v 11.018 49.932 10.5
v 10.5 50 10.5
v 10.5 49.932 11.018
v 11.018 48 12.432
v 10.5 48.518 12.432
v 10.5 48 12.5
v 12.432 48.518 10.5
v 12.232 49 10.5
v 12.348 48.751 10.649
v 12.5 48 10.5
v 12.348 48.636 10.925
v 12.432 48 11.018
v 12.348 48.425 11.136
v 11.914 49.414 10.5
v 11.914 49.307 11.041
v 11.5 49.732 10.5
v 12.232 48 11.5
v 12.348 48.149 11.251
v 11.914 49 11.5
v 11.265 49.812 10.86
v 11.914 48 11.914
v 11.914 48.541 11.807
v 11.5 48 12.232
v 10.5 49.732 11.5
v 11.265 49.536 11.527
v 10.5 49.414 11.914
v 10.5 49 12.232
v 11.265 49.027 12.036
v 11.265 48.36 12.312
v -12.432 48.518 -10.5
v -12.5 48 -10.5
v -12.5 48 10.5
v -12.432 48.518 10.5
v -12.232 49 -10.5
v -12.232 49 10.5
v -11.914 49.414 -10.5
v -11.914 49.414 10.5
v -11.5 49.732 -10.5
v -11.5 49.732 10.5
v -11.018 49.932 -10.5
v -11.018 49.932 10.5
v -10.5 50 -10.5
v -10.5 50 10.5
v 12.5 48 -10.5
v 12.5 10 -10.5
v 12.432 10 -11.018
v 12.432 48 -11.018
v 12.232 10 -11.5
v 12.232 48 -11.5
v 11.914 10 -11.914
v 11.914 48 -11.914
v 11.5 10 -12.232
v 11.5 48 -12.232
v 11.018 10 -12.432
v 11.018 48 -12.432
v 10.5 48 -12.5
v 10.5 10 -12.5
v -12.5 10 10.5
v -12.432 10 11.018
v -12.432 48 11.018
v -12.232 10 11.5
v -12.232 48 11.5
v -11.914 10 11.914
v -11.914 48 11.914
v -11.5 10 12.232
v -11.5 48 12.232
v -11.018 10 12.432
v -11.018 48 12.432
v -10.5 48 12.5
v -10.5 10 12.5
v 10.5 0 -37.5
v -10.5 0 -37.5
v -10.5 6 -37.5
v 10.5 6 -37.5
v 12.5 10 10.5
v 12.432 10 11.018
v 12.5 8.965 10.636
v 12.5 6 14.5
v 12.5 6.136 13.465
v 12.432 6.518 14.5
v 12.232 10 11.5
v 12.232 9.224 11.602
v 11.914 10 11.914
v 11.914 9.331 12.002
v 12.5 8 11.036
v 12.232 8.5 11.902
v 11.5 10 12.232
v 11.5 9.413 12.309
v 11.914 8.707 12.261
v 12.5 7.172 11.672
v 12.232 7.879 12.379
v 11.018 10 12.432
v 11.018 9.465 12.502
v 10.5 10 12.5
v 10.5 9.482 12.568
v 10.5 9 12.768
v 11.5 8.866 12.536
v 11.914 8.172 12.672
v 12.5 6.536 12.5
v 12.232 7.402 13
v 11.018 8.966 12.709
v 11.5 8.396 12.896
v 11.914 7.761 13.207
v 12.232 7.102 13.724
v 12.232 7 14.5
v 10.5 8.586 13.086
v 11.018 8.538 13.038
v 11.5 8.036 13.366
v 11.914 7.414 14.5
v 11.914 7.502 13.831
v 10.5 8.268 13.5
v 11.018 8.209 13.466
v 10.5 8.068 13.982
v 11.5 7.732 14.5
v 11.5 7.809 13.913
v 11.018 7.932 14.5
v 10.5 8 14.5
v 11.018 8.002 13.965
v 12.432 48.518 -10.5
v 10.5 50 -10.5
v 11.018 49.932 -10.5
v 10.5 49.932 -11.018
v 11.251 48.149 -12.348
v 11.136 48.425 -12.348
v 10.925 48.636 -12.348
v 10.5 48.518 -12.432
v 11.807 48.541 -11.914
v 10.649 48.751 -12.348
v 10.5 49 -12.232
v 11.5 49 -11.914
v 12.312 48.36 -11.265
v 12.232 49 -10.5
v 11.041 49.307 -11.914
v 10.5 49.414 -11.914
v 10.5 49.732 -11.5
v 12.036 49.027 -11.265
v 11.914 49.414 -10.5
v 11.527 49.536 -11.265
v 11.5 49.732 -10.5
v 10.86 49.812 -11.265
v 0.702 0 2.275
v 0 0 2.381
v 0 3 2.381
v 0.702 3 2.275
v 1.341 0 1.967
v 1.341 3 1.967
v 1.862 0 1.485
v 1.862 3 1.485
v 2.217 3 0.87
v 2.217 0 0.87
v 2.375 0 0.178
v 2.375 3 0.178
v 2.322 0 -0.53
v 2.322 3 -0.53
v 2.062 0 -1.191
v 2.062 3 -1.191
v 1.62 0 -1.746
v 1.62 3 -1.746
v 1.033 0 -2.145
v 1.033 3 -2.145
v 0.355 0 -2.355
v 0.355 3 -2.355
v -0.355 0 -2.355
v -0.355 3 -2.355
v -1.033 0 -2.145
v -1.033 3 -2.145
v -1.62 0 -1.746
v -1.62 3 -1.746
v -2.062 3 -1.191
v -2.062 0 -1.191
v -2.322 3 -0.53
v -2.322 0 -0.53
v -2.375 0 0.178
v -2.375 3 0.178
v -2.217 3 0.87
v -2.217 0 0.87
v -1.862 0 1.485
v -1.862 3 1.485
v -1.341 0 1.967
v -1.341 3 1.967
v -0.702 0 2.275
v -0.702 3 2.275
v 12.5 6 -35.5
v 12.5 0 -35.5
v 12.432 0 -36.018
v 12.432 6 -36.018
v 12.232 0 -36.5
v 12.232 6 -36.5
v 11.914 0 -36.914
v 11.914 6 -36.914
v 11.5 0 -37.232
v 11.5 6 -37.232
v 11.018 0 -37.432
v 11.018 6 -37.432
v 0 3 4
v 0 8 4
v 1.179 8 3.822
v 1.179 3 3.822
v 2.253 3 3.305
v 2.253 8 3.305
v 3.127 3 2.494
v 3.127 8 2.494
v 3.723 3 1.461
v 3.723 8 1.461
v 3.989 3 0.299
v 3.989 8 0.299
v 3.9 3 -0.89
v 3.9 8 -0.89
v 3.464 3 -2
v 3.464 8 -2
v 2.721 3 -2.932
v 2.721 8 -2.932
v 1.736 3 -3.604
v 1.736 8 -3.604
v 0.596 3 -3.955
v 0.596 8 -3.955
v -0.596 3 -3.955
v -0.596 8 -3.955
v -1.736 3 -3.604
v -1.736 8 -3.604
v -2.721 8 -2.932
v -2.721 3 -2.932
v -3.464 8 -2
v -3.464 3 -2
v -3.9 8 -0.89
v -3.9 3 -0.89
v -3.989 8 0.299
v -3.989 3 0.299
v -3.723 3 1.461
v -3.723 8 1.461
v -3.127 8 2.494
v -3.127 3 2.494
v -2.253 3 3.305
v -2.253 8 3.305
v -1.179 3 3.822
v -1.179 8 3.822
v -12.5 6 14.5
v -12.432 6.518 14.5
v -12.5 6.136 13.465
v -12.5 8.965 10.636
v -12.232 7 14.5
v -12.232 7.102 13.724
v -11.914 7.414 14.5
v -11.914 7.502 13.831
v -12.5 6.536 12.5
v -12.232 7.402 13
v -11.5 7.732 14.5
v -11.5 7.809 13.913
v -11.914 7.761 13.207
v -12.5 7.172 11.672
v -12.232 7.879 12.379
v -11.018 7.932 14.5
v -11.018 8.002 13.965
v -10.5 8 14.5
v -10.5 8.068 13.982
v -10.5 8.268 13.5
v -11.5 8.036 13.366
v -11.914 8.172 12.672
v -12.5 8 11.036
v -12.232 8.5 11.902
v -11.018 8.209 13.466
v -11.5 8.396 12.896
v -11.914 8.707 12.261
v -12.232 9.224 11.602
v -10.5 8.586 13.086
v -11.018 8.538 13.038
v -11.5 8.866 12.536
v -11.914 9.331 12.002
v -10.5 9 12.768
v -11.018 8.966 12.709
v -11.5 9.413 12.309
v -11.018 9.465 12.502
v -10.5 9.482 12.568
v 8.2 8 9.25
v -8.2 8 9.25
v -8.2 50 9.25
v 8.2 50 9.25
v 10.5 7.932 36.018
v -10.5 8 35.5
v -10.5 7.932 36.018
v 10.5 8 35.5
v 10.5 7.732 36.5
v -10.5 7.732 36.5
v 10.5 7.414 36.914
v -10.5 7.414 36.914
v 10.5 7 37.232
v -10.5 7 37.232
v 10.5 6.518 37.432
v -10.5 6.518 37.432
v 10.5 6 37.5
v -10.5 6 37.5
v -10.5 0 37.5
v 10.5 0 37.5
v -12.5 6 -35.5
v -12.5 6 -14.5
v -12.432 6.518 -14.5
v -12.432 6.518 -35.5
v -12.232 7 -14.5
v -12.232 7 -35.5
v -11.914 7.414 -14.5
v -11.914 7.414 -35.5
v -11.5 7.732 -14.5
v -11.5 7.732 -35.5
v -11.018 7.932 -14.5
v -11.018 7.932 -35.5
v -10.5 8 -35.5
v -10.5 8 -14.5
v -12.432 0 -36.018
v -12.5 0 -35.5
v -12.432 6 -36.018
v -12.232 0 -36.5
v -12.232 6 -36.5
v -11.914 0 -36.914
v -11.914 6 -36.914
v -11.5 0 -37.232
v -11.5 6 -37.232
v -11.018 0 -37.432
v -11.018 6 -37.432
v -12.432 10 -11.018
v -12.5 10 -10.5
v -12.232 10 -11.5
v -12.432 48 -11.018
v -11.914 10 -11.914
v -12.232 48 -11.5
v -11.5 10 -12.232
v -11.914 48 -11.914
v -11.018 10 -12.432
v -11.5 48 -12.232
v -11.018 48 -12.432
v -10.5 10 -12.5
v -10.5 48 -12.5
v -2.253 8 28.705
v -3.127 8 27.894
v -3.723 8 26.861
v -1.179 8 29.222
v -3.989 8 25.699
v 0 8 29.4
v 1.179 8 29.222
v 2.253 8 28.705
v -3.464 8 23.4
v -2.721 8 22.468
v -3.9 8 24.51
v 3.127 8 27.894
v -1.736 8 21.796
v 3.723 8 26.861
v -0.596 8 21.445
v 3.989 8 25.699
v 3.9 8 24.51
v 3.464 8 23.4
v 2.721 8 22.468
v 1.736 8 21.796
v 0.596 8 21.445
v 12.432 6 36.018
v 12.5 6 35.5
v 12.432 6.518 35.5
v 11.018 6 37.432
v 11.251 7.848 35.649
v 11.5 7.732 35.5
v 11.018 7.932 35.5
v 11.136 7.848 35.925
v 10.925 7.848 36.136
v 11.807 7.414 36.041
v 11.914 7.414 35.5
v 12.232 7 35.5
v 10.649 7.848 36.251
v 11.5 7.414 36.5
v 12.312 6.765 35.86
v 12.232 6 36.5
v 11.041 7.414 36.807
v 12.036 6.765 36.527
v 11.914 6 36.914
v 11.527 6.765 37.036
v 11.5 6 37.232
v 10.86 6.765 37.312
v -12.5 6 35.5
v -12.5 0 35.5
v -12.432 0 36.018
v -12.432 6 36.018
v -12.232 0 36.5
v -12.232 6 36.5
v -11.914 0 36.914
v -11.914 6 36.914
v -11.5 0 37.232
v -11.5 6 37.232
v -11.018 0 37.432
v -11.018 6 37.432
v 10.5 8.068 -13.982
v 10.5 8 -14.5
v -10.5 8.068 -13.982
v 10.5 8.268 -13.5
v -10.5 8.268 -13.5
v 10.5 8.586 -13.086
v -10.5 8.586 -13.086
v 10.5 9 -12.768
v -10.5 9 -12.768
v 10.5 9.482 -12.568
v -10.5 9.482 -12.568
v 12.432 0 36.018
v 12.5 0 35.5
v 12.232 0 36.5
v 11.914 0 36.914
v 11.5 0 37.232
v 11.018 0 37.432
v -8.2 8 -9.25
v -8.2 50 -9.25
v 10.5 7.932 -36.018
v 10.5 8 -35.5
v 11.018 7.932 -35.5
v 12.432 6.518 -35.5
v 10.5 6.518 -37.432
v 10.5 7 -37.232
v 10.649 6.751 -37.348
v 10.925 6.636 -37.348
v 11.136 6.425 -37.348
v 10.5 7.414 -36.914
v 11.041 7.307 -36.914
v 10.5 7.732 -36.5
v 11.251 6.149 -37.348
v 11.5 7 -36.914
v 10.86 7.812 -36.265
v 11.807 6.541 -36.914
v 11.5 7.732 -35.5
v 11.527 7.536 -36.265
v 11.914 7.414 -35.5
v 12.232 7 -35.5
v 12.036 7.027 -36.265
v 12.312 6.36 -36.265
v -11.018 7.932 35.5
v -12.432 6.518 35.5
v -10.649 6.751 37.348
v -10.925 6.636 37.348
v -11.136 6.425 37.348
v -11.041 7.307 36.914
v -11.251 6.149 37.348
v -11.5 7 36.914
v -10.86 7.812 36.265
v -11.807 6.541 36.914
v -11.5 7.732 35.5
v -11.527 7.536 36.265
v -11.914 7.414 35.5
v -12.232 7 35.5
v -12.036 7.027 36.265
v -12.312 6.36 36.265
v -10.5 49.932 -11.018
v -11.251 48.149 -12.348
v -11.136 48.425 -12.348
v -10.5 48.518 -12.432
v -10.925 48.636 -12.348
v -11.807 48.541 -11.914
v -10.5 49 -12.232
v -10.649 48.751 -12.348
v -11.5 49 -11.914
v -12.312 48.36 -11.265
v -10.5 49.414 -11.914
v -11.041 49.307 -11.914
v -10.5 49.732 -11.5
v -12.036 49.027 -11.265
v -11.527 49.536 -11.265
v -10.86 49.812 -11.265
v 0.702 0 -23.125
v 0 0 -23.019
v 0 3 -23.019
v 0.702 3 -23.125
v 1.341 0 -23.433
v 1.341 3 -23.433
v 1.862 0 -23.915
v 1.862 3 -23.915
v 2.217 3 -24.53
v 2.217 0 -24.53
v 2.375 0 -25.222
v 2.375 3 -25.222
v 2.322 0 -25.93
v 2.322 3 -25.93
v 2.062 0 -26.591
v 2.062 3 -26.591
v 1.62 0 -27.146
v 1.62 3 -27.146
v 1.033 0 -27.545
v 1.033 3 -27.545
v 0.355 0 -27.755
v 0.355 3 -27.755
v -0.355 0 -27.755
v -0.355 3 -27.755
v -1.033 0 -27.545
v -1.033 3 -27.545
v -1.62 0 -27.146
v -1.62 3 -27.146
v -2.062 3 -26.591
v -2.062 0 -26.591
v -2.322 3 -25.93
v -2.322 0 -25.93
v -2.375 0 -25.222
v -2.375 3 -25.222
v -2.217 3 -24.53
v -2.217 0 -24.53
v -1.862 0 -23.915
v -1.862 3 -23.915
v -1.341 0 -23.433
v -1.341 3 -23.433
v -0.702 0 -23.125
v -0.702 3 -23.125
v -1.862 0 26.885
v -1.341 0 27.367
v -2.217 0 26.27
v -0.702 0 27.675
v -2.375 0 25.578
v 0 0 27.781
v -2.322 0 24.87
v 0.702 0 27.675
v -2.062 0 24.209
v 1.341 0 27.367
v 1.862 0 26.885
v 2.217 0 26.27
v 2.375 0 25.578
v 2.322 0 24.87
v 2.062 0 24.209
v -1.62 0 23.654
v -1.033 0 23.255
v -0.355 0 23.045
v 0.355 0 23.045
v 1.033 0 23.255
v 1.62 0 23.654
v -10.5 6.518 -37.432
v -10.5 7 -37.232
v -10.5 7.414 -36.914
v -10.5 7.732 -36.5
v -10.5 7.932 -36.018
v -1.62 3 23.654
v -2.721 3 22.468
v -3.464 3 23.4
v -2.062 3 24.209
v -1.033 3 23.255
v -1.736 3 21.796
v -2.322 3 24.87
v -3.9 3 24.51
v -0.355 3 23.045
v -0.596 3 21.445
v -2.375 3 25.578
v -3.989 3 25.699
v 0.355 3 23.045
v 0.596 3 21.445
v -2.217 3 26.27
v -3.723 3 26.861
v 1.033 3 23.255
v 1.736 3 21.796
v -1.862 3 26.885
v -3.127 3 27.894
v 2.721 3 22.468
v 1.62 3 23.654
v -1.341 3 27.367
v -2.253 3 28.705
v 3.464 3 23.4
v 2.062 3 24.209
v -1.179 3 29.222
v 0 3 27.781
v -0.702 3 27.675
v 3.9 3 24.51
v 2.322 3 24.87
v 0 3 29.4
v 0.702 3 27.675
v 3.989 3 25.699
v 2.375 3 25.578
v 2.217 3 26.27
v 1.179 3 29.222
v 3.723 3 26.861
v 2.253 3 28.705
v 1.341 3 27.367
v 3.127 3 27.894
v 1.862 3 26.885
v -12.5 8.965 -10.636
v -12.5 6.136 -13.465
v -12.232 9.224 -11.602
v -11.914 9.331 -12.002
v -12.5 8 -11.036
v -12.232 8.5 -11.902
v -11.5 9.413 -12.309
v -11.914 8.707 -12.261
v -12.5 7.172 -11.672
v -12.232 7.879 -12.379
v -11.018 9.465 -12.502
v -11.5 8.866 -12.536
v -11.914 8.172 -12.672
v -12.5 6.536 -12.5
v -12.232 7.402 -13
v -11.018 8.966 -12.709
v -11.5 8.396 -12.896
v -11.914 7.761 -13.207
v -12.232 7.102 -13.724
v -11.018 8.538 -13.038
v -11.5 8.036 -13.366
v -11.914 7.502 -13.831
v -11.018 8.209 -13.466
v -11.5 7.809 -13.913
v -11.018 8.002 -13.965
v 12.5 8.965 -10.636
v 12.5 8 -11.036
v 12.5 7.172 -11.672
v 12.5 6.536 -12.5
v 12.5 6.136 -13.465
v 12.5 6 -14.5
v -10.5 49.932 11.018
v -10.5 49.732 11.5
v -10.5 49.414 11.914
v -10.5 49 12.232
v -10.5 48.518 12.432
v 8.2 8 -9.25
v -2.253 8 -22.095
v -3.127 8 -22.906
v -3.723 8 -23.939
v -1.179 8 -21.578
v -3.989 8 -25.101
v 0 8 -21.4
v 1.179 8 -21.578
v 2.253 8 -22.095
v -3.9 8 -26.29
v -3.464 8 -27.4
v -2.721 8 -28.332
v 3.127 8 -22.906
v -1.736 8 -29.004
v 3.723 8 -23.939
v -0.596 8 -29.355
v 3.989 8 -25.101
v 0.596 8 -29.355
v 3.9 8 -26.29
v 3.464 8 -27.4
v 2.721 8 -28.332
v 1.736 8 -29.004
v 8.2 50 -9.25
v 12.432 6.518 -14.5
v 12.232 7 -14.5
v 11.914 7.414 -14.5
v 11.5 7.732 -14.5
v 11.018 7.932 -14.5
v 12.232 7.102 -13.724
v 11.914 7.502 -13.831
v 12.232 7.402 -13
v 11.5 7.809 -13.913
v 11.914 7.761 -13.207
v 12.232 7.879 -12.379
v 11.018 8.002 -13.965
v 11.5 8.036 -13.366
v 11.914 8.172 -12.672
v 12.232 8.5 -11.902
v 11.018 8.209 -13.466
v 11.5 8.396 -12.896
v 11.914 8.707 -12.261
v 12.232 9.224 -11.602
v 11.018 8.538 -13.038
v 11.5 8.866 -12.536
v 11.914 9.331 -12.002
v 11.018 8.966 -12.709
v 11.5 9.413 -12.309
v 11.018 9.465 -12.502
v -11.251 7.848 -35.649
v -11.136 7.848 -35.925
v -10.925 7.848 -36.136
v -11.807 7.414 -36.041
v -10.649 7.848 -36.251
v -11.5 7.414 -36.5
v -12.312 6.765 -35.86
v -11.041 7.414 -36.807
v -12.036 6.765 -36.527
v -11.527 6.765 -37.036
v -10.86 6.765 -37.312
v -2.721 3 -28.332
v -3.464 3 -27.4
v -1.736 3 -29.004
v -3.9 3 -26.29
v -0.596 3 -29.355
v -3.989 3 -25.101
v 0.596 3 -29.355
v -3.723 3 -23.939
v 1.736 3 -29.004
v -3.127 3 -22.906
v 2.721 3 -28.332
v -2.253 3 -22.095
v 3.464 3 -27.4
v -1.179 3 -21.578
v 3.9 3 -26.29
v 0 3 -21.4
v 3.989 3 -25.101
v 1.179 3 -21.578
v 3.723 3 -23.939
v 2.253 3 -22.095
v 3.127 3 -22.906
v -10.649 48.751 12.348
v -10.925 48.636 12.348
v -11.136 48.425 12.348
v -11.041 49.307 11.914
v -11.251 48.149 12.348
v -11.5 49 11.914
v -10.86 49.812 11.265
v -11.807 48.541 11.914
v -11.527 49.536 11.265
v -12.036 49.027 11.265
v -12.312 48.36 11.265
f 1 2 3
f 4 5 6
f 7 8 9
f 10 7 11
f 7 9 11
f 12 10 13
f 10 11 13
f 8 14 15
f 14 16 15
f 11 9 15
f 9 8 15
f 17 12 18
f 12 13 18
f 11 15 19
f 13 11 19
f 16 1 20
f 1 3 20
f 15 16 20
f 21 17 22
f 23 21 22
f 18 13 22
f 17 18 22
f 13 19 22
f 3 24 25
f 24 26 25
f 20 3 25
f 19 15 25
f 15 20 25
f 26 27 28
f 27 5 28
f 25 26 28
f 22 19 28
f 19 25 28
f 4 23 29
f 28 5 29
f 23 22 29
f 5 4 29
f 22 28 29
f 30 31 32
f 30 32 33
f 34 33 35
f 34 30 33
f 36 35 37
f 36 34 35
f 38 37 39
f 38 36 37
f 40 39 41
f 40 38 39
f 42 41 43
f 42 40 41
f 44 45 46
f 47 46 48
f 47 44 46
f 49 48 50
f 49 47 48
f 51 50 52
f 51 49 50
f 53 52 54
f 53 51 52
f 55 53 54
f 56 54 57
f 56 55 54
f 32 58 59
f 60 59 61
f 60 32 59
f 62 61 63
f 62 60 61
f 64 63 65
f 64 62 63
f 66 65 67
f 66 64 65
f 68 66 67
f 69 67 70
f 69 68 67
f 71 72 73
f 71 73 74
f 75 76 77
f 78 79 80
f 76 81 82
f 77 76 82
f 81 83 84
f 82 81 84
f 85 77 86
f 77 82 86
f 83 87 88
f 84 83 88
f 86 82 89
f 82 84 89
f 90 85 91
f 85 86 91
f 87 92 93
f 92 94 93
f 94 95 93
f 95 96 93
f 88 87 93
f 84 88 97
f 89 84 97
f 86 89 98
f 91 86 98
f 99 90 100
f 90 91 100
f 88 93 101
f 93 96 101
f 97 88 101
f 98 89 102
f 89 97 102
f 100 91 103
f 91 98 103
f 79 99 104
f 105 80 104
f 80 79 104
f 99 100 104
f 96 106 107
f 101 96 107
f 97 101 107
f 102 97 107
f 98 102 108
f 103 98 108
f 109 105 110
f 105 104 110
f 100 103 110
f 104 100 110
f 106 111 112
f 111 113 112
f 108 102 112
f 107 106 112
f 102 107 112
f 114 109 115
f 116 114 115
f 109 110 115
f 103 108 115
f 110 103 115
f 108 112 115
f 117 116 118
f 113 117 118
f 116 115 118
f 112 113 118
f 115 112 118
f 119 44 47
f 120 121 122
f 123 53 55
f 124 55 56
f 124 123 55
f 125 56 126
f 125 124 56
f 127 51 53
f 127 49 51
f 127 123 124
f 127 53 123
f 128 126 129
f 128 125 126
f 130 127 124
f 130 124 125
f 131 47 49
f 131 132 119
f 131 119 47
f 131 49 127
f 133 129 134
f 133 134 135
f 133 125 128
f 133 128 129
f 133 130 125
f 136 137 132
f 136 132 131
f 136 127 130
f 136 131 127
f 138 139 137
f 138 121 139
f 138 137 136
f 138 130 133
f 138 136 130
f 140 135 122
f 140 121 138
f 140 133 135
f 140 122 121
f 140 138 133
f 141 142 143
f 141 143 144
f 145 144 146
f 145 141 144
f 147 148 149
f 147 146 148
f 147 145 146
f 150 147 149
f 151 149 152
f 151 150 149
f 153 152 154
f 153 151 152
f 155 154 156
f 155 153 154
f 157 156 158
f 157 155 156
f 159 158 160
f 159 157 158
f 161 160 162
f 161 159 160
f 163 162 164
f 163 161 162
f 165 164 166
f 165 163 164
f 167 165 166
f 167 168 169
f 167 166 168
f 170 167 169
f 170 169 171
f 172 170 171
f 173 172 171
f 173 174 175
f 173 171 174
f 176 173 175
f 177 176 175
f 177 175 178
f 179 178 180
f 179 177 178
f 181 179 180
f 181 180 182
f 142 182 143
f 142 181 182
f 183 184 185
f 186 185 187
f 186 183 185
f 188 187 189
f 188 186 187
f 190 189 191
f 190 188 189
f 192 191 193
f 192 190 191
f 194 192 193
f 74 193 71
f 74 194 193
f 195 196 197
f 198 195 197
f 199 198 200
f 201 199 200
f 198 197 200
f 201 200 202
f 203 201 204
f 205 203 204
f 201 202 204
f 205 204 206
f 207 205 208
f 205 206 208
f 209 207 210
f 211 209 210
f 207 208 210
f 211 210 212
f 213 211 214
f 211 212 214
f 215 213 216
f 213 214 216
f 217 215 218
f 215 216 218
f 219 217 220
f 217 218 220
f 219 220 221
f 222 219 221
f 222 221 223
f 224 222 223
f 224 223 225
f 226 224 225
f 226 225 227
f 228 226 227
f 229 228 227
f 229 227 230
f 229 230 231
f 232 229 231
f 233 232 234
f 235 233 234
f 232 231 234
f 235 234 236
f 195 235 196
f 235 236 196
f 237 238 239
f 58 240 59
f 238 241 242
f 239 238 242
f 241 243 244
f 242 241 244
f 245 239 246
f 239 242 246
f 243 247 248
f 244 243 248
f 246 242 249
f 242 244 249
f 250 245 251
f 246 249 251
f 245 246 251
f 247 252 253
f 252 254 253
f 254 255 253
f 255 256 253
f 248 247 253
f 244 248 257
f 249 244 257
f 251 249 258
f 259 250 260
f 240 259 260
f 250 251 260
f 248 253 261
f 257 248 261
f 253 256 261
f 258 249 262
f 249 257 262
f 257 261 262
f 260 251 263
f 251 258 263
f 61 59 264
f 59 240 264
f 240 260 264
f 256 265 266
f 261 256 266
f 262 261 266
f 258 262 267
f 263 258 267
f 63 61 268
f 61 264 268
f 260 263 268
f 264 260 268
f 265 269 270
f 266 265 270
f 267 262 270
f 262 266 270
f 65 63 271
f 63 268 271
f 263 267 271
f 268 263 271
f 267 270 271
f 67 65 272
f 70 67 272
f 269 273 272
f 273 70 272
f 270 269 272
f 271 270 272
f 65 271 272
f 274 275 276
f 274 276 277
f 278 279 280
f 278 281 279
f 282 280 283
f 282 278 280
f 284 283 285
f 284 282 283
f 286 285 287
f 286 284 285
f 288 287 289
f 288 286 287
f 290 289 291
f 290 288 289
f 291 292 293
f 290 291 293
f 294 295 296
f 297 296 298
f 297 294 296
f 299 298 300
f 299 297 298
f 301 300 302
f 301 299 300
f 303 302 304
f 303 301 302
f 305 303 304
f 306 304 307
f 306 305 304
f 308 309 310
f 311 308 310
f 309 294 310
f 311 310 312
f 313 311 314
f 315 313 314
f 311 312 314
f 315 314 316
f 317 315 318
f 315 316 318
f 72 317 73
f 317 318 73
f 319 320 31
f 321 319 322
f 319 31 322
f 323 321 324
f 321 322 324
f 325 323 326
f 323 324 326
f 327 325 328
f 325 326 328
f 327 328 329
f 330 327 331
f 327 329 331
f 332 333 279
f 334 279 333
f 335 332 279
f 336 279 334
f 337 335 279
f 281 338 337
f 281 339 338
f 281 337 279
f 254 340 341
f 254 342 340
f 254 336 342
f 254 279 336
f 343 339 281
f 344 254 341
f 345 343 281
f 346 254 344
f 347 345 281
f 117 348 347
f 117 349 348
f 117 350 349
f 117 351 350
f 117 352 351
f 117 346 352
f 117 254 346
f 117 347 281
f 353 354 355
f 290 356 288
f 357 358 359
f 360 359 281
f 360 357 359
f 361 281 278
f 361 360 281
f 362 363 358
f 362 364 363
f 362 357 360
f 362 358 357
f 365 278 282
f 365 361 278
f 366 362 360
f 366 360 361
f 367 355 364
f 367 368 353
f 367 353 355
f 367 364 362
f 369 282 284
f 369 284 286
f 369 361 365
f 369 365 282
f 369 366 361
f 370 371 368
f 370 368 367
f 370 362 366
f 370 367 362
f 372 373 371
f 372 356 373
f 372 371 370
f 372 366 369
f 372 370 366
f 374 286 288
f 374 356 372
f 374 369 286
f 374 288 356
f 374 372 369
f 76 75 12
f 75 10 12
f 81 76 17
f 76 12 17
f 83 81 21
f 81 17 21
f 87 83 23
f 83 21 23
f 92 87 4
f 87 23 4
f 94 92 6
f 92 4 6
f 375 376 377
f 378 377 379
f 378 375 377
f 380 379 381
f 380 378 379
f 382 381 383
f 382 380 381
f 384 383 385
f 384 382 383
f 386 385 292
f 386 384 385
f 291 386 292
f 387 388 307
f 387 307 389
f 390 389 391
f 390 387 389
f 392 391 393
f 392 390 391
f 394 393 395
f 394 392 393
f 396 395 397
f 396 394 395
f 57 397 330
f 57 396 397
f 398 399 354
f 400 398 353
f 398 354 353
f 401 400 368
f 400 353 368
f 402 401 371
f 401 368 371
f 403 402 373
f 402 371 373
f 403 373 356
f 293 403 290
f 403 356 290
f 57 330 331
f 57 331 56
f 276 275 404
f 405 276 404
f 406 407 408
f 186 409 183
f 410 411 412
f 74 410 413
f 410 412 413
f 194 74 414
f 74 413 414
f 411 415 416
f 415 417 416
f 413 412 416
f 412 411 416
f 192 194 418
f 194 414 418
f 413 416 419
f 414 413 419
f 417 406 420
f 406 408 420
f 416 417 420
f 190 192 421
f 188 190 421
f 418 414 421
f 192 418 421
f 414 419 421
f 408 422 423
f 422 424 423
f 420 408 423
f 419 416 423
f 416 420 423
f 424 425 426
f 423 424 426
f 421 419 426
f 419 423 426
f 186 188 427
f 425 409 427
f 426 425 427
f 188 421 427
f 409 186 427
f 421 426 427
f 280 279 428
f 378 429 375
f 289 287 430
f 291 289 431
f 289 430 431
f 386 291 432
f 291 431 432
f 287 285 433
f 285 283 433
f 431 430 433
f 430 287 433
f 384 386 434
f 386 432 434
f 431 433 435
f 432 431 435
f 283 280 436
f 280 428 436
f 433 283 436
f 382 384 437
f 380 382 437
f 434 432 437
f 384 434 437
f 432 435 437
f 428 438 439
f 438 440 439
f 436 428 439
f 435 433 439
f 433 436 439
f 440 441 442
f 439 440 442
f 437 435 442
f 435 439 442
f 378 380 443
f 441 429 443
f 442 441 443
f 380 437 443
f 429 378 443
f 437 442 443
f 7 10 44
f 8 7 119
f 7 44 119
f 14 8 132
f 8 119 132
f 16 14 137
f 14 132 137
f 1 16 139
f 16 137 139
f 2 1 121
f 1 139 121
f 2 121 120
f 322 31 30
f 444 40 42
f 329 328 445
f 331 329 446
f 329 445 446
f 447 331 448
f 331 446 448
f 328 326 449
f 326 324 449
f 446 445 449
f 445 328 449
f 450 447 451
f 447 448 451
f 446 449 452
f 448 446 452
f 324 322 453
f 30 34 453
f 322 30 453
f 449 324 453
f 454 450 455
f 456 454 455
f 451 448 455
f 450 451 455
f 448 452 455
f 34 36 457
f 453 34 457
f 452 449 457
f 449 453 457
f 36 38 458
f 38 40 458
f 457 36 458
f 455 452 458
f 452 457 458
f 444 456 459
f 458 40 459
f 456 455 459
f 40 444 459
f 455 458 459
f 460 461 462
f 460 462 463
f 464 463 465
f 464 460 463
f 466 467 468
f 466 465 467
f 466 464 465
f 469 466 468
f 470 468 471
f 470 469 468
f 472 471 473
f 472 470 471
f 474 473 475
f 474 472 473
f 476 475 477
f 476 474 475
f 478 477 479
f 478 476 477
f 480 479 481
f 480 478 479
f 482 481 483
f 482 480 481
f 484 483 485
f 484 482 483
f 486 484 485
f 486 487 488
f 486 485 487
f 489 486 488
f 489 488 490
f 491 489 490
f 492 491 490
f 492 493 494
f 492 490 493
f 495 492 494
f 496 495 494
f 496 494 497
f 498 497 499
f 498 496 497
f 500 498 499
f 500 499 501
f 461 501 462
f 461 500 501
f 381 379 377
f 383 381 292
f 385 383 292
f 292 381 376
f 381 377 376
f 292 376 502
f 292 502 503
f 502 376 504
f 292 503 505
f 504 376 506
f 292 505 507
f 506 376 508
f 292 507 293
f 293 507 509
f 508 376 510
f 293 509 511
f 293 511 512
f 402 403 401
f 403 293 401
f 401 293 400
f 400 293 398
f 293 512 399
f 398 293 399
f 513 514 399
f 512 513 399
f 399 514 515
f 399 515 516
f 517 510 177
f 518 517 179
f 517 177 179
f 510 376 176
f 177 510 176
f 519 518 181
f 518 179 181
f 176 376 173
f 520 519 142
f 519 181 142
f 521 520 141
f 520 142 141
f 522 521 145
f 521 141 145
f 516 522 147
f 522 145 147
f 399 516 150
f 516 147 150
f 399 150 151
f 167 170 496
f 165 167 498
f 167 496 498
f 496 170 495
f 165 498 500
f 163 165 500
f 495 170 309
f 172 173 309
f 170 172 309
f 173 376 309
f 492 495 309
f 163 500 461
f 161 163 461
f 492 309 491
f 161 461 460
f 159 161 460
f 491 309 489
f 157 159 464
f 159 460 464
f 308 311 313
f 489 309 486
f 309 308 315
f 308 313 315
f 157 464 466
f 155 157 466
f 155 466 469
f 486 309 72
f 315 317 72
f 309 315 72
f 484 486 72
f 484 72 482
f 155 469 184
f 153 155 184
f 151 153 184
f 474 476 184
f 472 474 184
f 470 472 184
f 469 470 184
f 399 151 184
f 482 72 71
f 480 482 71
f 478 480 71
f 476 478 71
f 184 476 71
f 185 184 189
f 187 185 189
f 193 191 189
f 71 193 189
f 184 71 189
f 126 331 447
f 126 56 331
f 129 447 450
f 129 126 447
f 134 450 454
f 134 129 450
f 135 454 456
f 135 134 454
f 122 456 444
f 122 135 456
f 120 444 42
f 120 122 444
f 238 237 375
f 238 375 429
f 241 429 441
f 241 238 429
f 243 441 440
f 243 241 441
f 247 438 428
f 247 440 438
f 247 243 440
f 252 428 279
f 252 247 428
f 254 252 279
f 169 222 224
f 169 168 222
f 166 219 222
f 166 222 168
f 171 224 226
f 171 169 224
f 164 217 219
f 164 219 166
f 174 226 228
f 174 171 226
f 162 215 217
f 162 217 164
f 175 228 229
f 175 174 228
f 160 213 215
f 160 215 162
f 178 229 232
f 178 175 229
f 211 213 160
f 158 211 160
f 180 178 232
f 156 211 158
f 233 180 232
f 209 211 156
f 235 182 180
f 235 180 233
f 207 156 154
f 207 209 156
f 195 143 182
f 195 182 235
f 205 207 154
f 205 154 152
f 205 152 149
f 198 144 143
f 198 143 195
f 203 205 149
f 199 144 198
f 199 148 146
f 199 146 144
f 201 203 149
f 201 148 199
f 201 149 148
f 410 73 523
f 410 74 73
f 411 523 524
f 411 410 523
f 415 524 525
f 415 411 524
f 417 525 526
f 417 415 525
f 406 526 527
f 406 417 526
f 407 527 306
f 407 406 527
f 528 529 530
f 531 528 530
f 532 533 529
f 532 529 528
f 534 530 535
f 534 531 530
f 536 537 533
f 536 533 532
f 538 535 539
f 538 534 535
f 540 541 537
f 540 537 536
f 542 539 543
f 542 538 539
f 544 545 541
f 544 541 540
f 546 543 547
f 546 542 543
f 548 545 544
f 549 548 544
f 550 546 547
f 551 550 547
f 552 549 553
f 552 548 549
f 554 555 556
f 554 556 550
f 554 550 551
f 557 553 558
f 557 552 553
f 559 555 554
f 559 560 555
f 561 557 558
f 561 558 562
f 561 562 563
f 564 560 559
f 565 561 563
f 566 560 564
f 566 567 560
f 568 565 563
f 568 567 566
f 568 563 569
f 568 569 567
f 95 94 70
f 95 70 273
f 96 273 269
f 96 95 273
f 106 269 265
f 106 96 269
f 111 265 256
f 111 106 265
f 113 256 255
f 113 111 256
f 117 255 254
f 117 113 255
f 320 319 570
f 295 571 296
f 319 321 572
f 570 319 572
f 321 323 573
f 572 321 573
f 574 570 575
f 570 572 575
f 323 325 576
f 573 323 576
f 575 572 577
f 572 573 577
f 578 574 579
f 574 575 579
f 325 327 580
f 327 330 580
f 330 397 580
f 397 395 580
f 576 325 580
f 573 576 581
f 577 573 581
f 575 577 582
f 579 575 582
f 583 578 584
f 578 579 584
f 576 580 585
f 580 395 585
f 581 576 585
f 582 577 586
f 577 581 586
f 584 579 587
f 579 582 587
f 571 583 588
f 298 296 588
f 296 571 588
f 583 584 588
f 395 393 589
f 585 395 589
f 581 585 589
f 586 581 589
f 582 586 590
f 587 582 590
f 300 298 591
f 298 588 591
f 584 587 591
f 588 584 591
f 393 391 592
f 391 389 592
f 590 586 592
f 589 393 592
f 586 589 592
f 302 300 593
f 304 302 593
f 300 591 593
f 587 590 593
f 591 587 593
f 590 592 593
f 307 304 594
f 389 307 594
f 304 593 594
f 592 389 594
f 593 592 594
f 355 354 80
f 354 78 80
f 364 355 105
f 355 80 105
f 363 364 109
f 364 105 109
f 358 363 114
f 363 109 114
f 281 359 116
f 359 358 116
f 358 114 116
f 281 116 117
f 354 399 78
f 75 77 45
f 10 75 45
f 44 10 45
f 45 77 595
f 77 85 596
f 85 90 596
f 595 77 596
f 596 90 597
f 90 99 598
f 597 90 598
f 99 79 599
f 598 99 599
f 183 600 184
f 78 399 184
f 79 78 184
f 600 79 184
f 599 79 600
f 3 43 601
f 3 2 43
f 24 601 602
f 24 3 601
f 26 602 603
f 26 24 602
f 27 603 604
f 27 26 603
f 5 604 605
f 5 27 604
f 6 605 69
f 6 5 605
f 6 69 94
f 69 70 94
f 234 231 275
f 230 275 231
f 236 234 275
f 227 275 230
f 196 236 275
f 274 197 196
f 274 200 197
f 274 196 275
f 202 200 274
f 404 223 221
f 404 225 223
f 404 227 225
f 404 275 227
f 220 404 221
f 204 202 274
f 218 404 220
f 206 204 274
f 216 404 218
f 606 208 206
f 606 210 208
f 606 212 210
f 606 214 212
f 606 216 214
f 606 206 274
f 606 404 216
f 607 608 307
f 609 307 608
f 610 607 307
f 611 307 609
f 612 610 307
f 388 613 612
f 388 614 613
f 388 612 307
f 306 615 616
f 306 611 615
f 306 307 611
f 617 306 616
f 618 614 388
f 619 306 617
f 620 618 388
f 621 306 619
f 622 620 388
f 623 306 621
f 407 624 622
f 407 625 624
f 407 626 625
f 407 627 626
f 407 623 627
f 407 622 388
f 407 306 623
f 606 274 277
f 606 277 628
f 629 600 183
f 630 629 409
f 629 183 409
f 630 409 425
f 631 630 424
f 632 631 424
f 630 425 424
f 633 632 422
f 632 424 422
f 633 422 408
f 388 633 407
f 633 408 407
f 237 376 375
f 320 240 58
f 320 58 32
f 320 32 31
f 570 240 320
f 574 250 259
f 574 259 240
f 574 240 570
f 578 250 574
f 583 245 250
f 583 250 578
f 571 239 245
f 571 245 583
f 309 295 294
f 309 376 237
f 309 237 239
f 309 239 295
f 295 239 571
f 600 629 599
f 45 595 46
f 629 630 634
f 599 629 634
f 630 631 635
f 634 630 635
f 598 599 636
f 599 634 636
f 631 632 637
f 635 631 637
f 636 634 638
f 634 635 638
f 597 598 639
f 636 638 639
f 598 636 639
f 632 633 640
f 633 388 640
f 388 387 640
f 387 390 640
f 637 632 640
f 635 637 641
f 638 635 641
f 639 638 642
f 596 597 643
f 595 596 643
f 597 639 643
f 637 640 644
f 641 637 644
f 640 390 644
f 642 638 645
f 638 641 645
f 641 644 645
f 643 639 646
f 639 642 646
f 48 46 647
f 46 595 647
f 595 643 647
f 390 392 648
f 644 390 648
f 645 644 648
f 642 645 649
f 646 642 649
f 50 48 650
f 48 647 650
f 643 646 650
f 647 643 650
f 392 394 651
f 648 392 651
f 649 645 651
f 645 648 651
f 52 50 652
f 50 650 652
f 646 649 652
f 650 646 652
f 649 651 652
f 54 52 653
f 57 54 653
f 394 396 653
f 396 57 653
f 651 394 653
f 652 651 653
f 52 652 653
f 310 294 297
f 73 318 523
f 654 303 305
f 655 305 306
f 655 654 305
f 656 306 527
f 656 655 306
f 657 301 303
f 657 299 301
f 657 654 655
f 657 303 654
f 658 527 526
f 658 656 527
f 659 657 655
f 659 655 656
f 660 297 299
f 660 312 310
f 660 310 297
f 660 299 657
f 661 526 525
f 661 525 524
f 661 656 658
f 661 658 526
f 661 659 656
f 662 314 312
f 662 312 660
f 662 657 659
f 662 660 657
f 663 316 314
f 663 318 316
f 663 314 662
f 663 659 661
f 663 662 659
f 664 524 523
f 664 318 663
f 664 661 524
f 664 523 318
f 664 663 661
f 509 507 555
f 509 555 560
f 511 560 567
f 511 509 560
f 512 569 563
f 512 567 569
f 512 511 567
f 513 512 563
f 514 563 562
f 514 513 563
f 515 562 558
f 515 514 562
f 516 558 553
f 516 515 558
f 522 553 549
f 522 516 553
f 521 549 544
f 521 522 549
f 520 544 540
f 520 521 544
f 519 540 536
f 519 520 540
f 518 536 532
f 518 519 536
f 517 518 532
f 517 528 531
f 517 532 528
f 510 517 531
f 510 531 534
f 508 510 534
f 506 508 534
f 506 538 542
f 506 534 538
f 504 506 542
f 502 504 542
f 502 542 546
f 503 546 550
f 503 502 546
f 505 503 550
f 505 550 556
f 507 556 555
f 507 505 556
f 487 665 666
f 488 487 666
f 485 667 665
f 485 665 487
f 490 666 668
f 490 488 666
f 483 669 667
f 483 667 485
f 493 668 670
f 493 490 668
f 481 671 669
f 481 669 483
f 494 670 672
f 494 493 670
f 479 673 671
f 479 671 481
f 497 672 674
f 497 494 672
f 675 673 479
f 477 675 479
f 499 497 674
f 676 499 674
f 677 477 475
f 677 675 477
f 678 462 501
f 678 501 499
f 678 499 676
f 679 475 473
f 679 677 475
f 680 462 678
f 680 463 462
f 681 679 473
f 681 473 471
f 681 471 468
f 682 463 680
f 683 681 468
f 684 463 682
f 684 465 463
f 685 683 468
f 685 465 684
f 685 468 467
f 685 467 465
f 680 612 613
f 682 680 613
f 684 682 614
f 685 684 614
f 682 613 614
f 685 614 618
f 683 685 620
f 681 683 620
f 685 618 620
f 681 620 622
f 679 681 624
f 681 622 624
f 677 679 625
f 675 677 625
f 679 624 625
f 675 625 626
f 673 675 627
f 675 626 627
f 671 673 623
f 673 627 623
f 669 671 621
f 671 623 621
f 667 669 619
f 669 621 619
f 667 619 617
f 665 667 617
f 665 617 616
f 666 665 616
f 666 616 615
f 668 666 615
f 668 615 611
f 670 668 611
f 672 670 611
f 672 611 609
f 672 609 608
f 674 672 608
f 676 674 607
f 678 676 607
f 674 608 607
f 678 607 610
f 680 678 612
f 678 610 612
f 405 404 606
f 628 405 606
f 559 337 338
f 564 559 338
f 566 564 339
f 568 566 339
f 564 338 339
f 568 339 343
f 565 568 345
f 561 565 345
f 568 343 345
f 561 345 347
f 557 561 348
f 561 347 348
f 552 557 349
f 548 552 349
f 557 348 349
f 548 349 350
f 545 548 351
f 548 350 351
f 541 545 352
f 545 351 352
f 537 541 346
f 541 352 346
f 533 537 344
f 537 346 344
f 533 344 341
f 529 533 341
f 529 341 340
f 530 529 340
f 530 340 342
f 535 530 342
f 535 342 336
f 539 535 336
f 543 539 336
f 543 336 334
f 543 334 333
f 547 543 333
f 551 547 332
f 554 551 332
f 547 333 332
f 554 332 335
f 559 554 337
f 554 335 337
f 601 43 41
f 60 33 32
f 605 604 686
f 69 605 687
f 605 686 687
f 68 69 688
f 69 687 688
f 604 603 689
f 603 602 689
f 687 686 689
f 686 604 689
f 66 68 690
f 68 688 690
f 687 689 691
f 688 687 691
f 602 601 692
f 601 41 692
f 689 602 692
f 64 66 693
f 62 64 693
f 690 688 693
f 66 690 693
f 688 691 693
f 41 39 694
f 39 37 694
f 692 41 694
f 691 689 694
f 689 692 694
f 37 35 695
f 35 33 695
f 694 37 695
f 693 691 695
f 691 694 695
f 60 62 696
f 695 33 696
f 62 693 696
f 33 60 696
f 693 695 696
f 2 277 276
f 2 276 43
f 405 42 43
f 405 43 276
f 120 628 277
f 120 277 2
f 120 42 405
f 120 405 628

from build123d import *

# Parameters (mm, degrees)
SKETCH1_W               = 25
SKETCH1_H               = 25
SKETCH1_W_2             = 16.4
SKETCH1_H_2             = 18.5
BOSS_EXTRUDE1_DEPTH     = 50
SKETCH6_W               = 25
SKETCH6_H               = 75
BOSS_EXTRUDE3_DEPTH     = 8
FILLET2_R               = 2
SKETCH7_R               = 4
CUT_EXTRUDE1_DEPTH      = 5
CUT_EXTRUDE4_DEPTH      = 64.73774392
CUT_EXTRUDE4_DEPTH_BACK = 64.73774392
SKETCH8_R               = 2.38125


with BuildPart() as part:
    # Sketch1 → Boss-Extrude1 (new body)
    with BuildSketch(Plane(origin=(0, 0, 0), x_dir=(1, 0, 0), z_dir=(0, 1, 0))):
        Rectangle(SKETCH1_W, SKETCH1_H)
        Rectangle(SKETCH1_W_2, SKETCH1_H_2, mode=Mode.SUBTRACT)
    extrude(amount=BOSS_EXTRUDE1_DEPTH)

    # Sketch6 → Boss-Extrude3 (add)
    with BuildSketch(Plane(origin=(0, 0, 0), x_dir=(1, 0, 0), z_dir=(0, 1, 0))):
        Rectangle(SKETCH6_W, SKETCH6_H)
    extrude(amount=BOSS_EXTRUDE3_DEPTH)

    # Fillet2
    fillet2_edges = [part.edges().sort_by_distance(p)[0] for p in [
        (-12.5, 50, 0),
        (0, 50, 12.5),
        (12.5, 4, 37.5),
        (-12.5, 4, -37.5),
        (-12.5, 8, -25),
        (0, 8, -12.5),
        (12.5, 8, -25),
        (0, 8, -37.5),
        (12.5, 8, 25),
        (0, 8, 12.5),
        (-12.5, 8, 25),
        (0, 8, 37.5),
        (12.5, 4, -37.5),
        (-12.5, 4, 37.5),
        (12.5, 50, 0),
        (12.5, 29, 12.5),
        (-12.5, 29, 12.5),
        (-12.5, 29, -12.5),
        (12.5, 29, -12.5),
        (0, 50, -12.5),
    ]]
    fillet(fillet2_edges, radius=FILLET2_R)

    # Sketch7 → Cut-Extrude1 (cut)
    with BuildSketch(Plane(origin=(0, 8, 0), x_dir=(1, 0, 0), z_dir=(0, 1, 0))):
        with Locations(Location((0, 0, 0), (0, 0, 270))):
            Circle(SKETCH7_R)
        with Locations(Location((0, 25.4, 0), (0, 0, 270))):
            Circle(SKETCH7_R)
        with Locations(Location((0, -25.4, 0), (0, 0, 270))):
            Circle(SKETCH7_R)
    extrude(amount=-CUT_EXTRUDE1_DEPTH, mode=Mode.SUBTRACT)

    # Sketch8 → Cut-Extrude4 (cut, two sides: drawn at the far end of the back side and taken through both)
    with BuildSketch(Plane(origin=(0, 0, 0), x_dir=(1, 0, 0), z_dir=(0, 1, 0)).offset(-CUT_EXTRUDE4_DEPTH_BACK)):
        with Locations(Location((0, 0, 0), (0, 0, 270))):
            Circle(SKETCH8_R)
        with Locations(Location((0, 25.4, 0), (0, 0, 270))):
            Circle(SKETCH8_R)
        with Locations(Location((0, -25.4, 0), (0, 0, 270))):
            Circle(SKETCH8_R)
    extrude(amount=CUT_EXTRUDE4_DEPTH + CUT_EXTRUDE4_DEPTH_BACK, mode=Mode.SUBTRACT)


solid = part.part
